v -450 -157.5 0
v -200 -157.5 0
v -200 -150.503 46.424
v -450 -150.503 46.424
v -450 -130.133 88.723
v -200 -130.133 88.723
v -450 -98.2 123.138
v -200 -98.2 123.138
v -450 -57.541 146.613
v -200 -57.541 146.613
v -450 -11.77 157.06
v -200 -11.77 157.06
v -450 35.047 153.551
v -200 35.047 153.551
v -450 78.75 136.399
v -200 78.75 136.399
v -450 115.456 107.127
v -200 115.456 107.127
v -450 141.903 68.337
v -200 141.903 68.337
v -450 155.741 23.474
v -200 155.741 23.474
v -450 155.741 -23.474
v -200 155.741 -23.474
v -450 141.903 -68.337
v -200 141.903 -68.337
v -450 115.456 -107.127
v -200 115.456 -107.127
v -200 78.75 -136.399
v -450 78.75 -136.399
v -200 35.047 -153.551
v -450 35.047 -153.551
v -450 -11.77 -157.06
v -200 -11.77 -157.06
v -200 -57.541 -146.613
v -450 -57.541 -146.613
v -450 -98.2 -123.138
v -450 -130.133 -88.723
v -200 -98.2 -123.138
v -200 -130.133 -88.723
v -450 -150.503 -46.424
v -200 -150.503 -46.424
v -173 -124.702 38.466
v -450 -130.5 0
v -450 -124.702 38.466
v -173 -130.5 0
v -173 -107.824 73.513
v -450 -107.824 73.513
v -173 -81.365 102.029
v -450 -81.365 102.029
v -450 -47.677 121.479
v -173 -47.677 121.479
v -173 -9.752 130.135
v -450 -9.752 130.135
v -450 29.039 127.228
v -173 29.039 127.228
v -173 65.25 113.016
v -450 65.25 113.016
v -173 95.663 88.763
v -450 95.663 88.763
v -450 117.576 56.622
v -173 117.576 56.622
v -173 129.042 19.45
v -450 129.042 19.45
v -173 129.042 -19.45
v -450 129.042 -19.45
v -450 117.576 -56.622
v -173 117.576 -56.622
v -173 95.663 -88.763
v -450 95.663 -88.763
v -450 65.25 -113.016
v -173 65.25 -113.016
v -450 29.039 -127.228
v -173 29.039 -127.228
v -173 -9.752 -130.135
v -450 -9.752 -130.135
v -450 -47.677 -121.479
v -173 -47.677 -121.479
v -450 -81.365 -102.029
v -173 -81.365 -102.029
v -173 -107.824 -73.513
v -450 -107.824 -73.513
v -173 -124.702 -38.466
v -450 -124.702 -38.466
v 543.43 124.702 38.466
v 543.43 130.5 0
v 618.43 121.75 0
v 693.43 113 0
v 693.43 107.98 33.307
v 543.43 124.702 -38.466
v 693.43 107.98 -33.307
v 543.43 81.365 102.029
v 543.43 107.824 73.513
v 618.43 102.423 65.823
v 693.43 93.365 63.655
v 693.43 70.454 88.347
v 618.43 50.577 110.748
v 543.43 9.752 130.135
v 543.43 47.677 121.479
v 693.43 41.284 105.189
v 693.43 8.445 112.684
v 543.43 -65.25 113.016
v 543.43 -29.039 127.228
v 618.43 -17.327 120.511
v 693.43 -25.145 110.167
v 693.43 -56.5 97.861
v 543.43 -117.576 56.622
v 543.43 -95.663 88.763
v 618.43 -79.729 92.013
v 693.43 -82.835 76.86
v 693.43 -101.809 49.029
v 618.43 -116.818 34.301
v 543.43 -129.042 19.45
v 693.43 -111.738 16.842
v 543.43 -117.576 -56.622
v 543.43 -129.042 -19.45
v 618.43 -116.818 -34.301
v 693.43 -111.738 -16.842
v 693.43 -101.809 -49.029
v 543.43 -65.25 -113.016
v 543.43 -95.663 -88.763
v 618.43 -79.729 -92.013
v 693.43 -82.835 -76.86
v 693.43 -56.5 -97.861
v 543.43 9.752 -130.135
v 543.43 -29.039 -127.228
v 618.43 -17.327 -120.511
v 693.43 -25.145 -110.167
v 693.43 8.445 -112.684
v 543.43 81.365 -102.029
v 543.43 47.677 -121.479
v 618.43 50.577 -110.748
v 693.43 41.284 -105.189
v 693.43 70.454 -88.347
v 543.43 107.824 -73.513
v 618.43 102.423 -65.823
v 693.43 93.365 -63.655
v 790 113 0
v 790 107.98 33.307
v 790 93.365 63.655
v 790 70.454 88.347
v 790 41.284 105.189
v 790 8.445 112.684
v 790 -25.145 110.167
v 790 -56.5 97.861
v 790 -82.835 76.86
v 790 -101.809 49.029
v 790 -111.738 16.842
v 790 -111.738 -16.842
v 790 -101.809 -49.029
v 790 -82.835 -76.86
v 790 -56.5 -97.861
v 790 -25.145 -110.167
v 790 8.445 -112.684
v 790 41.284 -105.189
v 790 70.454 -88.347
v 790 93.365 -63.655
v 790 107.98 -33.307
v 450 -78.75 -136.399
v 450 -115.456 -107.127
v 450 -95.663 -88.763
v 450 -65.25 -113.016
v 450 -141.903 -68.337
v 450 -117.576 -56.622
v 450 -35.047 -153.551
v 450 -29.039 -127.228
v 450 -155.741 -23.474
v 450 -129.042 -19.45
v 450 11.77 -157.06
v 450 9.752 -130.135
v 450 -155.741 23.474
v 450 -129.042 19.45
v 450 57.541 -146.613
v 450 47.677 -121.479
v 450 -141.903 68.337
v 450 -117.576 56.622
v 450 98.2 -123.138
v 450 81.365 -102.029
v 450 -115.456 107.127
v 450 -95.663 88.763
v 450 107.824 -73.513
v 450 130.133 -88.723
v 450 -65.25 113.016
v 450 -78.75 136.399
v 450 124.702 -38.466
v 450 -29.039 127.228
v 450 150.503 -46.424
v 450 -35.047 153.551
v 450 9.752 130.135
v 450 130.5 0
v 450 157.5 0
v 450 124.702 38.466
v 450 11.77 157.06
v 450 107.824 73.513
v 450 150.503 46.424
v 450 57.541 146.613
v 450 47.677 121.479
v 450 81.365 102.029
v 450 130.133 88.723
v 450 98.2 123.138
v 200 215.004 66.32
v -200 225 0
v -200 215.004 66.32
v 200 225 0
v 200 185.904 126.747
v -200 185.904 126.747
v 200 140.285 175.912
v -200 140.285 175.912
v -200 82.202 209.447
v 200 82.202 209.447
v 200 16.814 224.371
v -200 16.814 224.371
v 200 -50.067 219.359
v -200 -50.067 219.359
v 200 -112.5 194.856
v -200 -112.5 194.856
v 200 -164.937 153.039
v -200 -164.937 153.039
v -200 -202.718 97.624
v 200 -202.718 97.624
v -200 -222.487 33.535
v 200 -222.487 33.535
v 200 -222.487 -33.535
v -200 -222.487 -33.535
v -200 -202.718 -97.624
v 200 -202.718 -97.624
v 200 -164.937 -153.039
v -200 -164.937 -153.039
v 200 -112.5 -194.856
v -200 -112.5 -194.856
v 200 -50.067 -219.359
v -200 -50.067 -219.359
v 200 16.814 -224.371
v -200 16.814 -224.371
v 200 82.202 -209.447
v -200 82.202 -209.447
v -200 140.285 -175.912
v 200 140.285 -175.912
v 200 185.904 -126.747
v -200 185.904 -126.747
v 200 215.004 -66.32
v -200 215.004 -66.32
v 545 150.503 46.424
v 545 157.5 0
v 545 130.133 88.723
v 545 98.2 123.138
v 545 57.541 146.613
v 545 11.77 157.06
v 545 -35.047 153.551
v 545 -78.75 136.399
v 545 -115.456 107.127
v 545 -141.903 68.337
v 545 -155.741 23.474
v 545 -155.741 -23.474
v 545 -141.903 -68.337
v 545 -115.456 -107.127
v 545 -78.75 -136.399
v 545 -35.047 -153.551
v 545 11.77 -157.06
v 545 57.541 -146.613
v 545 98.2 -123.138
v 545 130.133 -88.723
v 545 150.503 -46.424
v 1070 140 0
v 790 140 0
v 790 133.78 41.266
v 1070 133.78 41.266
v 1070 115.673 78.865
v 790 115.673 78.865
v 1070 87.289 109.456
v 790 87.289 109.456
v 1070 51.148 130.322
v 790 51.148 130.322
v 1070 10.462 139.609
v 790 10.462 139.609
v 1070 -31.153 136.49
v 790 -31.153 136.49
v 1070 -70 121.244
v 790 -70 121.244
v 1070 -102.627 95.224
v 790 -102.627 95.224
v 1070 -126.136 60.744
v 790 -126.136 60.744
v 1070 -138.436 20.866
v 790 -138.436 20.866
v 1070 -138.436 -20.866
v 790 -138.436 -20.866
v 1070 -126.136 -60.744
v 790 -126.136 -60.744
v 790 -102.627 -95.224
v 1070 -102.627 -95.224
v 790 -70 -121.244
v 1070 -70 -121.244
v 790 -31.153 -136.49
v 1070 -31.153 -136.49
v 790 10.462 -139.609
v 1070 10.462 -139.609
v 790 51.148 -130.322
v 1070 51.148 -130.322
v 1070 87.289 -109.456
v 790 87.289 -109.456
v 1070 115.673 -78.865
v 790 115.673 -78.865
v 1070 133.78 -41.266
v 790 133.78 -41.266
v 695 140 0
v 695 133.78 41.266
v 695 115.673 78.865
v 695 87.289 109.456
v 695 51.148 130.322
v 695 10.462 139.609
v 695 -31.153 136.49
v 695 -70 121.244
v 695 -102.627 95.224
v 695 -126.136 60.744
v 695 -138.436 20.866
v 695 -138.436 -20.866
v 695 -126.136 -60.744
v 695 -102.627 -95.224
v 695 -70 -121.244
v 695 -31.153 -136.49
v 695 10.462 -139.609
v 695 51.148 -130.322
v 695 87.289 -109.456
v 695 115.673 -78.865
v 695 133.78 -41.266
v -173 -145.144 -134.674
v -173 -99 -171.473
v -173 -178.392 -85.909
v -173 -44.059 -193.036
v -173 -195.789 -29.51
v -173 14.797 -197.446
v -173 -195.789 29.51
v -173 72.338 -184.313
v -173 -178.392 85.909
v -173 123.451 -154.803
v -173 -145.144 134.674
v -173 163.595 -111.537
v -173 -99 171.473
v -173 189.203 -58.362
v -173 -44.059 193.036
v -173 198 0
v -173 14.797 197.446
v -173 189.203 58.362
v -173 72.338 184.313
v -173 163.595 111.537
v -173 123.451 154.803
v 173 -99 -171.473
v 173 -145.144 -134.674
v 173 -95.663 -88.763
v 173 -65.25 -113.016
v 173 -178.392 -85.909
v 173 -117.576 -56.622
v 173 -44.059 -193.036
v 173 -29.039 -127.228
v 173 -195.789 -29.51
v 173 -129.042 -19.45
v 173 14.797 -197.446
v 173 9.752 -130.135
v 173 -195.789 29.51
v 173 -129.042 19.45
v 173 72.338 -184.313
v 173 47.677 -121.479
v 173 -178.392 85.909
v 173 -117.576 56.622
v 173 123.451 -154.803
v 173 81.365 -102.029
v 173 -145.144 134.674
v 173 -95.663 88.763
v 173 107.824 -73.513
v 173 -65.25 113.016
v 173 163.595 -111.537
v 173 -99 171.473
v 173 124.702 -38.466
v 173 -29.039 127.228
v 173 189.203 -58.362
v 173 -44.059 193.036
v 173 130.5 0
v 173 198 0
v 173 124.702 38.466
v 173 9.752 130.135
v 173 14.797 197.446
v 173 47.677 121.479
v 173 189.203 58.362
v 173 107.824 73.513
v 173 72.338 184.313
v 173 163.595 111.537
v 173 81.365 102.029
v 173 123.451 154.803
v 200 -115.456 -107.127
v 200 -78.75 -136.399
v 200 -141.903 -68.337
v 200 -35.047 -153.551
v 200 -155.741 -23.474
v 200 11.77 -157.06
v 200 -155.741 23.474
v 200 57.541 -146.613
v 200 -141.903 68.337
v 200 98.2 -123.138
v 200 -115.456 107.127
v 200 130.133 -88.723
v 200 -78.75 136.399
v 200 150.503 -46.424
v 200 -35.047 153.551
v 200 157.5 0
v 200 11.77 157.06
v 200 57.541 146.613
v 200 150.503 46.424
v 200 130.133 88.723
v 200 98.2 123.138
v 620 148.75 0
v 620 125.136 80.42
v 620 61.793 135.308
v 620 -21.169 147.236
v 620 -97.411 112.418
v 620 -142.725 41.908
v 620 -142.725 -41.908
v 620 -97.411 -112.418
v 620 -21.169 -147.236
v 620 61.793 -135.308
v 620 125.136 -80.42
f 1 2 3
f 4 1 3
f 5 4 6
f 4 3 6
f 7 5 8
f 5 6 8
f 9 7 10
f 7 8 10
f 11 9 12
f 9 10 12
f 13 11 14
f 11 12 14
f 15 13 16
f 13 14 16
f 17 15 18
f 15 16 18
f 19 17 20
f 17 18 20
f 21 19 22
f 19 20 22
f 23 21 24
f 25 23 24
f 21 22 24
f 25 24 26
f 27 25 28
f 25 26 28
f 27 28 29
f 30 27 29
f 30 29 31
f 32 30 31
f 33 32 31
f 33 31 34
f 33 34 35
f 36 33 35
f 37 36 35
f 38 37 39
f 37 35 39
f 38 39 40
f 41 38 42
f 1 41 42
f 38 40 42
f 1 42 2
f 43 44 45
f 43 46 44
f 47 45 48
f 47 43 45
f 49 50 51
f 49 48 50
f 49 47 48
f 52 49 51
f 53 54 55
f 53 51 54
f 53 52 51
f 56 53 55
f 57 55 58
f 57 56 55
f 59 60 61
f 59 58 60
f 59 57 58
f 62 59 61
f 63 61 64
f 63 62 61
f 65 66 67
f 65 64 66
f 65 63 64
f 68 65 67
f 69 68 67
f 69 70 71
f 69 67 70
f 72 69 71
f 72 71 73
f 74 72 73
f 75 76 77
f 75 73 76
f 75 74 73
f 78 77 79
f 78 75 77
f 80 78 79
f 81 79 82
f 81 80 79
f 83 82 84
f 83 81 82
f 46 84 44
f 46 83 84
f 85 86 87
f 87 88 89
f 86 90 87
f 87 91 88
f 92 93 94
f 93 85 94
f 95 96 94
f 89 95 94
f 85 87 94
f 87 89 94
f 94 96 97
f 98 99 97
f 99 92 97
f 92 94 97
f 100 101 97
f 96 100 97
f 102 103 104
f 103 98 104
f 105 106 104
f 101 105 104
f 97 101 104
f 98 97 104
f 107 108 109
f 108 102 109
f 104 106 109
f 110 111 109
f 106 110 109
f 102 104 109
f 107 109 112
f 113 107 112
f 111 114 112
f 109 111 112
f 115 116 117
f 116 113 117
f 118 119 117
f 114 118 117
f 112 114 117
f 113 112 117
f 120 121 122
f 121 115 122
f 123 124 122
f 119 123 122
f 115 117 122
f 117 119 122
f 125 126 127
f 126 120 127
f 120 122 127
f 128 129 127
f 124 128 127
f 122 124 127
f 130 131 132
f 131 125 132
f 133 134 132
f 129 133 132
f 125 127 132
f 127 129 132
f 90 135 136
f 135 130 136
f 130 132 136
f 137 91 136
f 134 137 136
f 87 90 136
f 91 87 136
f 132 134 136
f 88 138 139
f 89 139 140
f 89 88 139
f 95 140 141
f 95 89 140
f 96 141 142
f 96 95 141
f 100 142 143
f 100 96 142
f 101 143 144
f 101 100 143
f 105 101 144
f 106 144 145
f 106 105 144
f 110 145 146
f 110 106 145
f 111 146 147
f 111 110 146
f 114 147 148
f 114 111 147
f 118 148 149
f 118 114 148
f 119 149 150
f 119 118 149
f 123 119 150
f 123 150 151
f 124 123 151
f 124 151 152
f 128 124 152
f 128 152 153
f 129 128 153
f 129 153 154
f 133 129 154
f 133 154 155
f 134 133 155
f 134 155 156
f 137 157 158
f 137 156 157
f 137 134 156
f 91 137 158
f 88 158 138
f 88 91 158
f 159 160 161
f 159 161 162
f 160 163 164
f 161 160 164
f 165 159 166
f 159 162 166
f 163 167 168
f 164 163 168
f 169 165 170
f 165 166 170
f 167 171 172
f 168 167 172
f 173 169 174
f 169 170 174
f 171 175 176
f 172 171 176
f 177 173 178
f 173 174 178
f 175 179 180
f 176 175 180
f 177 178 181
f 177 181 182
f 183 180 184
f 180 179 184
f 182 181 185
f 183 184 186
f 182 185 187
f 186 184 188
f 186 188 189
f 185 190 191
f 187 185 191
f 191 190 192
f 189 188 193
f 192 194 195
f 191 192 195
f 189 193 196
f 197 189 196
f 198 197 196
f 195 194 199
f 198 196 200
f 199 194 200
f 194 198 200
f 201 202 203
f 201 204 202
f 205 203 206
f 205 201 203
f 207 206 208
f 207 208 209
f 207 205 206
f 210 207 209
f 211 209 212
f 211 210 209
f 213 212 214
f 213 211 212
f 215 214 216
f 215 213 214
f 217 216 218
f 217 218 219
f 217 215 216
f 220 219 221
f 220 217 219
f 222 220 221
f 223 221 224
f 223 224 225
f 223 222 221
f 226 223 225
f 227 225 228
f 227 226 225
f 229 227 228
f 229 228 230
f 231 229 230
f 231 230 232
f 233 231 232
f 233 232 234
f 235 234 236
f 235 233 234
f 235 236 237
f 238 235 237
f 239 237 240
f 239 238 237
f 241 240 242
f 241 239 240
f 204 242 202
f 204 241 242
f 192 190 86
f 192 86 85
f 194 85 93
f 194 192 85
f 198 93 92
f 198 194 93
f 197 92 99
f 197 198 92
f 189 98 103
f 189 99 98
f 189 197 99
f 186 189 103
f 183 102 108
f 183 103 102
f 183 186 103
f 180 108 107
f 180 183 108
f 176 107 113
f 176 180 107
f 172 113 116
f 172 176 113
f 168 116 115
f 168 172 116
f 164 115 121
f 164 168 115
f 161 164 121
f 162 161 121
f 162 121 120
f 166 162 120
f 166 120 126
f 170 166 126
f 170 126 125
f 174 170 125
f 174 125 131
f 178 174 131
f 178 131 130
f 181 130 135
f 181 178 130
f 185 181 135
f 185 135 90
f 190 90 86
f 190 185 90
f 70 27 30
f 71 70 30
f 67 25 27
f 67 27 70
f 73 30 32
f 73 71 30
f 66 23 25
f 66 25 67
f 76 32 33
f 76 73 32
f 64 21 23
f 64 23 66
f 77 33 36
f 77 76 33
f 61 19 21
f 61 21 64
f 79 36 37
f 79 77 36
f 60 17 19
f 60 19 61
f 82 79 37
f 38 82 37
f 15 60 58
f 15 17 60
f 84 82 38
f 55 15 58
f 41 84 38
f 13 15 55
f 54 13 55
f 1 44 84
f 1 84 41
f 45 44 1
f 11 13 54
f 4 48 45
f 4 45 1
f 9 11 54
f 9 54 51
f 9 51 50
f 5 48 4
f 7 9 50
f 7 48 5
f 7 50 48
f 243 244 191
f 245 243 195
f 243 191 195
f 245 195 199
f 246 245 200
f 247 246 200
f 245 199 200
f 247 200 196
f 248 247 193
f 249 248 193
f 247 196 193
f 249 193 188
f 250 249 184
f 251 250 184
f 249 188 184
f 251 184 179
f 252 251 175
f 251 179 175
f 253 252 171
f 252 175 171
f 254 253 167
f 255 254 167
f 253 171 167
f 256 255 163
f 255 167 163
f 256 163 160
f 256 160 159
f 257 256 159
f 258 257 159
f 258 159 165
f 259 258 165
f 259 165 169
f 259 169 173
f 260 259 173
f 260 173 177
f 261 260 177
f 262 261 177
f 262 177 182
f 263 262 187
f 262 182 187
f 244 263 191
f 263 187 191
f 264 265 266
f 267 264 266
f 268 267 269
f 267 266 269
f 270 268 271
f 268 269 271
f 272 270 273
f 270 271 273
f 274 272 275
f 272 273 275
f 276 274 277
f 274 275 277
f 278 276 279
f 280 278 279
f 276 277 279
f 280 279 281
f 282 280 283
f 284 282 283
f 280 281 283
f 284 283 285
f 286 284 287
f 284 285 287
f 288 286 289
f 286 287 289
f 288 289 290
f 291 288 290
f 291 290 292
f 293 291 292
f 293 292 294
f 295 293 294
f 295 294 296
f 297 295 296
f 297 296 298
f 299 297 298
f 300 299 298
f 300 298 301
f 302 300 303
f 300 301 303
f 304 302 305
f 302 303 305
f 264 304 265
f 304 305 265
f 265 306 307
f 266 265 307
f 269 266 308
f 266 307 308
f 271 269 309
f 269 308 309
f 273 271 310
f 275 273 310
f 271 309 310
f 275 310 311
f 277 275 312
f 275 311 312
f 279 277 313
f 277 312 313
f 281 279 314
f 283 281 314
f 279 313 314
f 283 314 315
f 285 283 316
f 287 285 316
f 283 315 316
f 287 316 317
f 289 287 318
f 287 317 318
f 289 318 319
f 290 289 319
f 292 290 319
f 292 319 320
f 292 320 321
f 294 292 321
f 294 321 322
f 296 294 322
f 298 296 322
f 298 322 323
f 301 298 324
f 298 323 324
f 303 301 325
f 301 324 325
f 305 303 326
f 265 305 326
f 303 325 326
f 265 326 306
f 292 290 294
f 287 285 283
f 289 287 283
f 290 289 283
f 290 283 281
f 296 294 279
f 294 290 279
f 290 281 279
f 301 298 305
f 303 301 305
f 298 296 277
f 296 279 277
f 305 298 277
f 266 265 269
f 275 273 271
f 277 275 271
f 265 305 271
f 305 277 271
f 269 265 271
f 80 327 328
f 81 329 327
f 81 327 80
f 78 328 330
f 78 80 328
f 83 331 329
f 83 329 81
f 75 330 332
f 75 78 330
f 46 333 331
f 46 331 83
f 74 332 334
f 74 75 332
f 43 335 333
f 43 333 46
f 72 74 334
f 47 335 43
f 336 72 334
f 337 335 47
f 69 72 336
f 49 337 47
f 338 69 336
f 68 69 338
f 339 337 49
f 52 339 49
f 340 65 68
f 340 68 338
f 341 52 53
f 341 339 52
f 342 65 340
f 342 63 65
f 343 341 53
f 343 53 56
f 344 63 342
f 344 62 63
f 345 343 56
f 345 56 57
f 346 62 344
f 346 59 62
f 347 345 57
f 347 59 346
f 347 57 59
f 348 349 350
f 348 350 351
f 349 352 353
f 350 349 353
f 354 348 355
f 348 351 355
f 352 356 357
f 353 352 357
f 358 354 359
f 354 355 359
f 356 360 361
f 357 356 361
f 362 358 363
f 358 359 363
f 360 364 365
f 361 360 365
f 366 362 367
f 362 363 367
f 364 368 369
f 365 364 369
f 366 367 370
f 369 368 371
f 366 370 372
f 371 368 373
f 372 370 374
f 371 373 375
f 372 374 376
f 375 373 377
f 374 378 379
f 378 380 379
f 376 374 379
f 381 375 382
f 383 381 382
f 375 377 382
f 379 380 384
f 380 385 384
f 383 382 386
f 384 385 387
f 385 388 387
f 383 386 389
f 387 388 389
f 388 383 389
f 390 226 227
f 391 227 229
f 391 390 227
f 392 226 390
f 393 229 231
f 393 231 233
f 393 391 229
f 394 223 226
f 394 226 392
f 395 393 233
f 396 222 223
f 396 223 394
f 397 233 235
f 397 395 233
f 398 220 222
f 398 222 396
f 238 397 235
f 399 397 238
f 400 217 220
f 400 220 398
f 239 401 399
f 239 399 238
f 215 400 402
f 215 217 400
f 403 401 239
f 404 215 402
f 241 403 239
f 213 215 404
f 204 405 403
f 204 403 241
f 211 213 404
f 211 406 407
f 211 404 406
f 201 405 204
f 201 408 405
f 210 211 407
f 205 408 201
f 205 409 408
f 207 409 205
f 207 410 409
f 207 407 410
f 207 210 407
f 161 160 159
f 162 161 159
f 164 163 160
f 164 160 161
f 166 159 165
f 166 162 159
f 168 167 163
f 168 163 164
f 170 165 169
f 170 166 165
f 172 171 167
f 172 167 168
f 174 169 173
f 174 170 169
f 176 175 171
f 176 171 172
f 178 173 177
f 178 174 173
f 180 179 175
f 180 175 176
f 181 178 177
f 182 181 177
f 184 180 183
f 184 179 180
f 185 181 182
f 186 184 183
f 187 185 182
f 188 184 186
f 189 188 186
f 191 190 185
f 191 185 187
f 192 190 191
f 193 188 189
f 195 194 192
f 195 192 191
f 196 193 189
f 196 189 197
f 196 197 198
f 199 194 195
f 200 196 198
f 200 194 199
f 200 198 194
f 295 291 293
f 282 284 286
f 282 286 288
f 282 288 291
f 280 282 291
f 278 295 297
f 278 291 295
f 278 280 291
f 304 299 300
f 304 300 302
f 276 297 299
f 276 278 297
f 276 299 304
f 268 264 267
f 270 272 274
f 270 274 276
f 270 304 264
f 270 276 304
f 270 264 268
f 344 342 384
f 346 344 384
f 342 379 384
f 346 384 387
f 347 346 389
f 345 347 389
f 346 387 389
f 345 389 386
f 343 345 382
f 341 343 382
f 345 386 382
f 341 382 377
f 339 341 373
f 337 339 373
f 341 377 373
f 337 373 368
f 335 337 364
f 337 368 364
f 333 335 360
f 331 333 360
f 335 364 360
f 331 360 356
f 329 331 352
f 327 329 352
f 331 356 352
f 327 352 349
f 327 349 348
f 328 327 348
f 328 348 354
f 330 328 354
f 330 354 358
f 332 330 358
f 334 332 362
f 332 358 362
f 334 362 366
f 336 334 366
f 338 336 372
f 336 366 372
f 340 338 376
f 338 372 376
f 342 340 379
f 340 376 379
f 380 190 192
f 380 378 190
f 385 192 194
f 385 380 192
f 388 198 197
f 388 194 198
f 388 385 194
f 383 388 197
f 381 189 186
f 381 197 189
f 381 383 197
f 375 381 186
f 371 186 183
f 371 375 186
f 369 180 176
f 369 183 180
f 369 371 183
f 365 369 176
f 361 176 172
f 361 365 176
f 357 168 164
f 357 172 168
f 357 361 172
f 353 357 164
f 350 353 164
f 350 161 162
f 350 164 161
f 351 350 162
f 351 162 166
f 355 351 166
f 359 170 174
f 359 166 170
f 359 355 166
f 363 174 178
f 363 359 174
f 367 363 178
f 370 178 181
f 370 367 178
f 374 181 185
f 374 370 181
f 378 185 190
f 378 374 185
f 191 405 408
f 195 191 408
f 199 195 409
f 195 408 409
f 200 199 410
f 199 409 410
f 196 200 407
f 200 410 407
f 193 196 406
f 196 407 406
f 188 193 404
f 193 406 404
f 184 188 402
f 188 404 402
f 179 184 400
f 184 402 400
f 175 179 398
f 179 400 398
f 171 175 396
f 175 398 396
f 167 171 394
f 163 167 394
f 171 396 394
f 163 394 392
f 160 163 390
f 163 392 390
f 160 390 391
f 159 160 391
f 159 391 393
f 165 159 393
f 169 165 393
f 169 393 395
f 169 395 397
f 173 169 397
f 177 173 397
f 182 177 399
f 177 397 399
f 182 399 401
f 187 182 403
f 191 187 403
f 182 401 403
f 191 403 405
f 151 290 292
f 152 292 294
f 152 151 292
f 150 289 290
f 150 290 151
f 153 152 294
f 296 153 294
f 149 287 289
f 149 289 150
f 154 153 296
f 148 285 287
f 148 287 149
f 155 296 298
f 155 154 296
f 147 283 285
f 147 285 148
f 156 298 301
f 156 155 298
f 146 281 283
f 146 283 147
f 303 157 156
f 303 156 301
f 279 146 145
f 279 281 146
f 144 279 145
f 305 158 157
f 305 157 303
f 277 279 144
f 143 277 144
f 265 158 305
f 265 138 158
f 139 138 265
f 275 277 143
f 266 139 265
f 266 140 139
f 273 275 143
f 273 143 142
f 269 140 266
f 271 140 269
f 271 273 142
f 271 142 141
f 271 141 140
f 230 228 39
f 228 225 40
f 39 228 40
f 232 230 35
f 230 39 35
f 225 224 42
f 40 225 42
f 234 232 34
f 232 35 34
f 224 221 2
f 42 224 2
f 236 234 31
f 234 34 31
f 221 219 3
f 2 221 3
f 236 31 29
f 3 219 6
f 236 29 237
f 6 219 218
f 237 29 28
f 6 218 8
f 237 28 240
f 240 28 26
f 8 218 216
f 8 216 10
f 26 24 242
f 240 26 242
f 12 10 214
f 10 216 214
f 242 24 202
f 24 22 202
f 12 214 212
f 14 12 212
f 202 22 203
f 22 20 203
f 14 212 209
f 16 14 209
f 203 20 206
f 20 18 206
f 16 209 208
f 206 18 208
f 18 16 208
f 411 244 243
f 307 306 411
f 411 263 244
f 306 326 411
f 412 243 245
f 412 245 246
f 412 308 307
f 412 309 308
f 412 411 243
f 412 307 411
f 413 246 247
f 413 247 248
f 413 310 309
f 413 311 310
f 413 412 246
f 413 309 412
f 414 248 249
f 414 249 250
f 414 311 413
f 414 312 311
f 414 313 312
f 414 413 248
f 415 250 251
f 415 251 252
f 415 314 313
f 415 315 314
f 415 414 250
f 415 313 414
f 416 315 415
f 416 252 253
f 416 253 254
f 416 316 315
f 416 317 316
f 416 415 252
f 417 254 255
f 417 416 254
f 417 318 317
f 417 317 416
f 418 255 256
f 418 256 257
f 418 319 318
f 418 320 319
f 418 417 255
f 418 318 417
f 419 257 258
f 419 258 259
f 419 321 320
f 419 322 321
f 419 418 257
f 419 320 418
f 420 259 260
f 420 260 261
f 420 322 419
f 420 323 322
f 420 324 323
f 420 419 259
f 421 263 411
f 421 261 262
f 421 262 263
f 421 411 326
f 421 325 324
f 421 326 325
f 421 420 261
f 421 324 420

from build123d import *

# Parameters (mm, degrees)
F0_R      = 225
F1_DEPTH  = 200
F2_R      = 157.5
F3_DEPTH  = 250
F4_R      = 157.5
F5_DEPTH  = 250
F6_R      = 157.5
F7_DEPTH  = 95
F8_R      = 157.5
F10_R     = 140
F12_R     = 140
F13_DEPTH = 95
F14_T     = -27
F15_T     = -27
F16_R     = 140
F17_DEPTH = 280


with BuildPart() as f1:
    # F0 (on Right) → F1 (new body, symmetric)
    with BuildSketch(Plane.YZ):
        Circle(F0_R)
    extrude(amount=F1_DEPTH, both=True)

    # F2 (on face) → F3 (join)
    with BuildSketch(Plane.YZ.offset(200)):
        Circle(F2_R)
    extrude(amount=F3_DEPTH)

    # F4 (on face) → F5 (join)
    with BuildSketch(Plane(origin=(-200, 0, 0), x_dir=(0, -1, 0), z_dir=(-1, 0, 0))):
        Circle(F4_R)
    extrude(amount=F5_DEPTH)

    # F14
    f14_openings = [f1.faces().sort_by_distance(p)[0] for p in [
        (-450, 0, 0),
        (450, 0, 0),
    ]]
    offset(amount=F14_T, openings=f14_openings, kind=Kind.INTERSECTION)


with BuildPart() as f7:
    # F6 (on face) → F7 (new body)
    with BuildSketch(Plane.YZ.offset(450)):
        Circle(F6_R)
    extrude(amount=F7_DEPTH)

    # F8 (on face) → F11 section 0
    with BuildSketch(Plane.YZ.offset(545)):
        Circle(F8_R)
    # F10 (on offset) → F11 section 1
    with BuildSketch(Plane.YZ.offset(695)):
        Circle(F10_R)
    loft()

    # F12 (on face) → F13 (join)
    with BuildSketch(Plane.YZ.offset(695)):
        Circle(F12_R)
    extrude(amount=F13_DEPTH)

    # F15
    f15_openings = [f7.faces().sort_by_distance(p)[0] for p in [
        (790, 0, 0),
        (450, 0, 0),
    ]]
    offset(amount=F15_T, openings=f15_openings, kind=Kind.INTERSECTION)


with BuildPart() as f17:
    # F16 (on face) → F17 (new body)
    with BuildSketch(Plane.YZ.offset(790)):
        Circle(F16_R)
    extrude(amount=F17_DEPTH)


solid = Compound([f1.part, f7.part, f17.part])
